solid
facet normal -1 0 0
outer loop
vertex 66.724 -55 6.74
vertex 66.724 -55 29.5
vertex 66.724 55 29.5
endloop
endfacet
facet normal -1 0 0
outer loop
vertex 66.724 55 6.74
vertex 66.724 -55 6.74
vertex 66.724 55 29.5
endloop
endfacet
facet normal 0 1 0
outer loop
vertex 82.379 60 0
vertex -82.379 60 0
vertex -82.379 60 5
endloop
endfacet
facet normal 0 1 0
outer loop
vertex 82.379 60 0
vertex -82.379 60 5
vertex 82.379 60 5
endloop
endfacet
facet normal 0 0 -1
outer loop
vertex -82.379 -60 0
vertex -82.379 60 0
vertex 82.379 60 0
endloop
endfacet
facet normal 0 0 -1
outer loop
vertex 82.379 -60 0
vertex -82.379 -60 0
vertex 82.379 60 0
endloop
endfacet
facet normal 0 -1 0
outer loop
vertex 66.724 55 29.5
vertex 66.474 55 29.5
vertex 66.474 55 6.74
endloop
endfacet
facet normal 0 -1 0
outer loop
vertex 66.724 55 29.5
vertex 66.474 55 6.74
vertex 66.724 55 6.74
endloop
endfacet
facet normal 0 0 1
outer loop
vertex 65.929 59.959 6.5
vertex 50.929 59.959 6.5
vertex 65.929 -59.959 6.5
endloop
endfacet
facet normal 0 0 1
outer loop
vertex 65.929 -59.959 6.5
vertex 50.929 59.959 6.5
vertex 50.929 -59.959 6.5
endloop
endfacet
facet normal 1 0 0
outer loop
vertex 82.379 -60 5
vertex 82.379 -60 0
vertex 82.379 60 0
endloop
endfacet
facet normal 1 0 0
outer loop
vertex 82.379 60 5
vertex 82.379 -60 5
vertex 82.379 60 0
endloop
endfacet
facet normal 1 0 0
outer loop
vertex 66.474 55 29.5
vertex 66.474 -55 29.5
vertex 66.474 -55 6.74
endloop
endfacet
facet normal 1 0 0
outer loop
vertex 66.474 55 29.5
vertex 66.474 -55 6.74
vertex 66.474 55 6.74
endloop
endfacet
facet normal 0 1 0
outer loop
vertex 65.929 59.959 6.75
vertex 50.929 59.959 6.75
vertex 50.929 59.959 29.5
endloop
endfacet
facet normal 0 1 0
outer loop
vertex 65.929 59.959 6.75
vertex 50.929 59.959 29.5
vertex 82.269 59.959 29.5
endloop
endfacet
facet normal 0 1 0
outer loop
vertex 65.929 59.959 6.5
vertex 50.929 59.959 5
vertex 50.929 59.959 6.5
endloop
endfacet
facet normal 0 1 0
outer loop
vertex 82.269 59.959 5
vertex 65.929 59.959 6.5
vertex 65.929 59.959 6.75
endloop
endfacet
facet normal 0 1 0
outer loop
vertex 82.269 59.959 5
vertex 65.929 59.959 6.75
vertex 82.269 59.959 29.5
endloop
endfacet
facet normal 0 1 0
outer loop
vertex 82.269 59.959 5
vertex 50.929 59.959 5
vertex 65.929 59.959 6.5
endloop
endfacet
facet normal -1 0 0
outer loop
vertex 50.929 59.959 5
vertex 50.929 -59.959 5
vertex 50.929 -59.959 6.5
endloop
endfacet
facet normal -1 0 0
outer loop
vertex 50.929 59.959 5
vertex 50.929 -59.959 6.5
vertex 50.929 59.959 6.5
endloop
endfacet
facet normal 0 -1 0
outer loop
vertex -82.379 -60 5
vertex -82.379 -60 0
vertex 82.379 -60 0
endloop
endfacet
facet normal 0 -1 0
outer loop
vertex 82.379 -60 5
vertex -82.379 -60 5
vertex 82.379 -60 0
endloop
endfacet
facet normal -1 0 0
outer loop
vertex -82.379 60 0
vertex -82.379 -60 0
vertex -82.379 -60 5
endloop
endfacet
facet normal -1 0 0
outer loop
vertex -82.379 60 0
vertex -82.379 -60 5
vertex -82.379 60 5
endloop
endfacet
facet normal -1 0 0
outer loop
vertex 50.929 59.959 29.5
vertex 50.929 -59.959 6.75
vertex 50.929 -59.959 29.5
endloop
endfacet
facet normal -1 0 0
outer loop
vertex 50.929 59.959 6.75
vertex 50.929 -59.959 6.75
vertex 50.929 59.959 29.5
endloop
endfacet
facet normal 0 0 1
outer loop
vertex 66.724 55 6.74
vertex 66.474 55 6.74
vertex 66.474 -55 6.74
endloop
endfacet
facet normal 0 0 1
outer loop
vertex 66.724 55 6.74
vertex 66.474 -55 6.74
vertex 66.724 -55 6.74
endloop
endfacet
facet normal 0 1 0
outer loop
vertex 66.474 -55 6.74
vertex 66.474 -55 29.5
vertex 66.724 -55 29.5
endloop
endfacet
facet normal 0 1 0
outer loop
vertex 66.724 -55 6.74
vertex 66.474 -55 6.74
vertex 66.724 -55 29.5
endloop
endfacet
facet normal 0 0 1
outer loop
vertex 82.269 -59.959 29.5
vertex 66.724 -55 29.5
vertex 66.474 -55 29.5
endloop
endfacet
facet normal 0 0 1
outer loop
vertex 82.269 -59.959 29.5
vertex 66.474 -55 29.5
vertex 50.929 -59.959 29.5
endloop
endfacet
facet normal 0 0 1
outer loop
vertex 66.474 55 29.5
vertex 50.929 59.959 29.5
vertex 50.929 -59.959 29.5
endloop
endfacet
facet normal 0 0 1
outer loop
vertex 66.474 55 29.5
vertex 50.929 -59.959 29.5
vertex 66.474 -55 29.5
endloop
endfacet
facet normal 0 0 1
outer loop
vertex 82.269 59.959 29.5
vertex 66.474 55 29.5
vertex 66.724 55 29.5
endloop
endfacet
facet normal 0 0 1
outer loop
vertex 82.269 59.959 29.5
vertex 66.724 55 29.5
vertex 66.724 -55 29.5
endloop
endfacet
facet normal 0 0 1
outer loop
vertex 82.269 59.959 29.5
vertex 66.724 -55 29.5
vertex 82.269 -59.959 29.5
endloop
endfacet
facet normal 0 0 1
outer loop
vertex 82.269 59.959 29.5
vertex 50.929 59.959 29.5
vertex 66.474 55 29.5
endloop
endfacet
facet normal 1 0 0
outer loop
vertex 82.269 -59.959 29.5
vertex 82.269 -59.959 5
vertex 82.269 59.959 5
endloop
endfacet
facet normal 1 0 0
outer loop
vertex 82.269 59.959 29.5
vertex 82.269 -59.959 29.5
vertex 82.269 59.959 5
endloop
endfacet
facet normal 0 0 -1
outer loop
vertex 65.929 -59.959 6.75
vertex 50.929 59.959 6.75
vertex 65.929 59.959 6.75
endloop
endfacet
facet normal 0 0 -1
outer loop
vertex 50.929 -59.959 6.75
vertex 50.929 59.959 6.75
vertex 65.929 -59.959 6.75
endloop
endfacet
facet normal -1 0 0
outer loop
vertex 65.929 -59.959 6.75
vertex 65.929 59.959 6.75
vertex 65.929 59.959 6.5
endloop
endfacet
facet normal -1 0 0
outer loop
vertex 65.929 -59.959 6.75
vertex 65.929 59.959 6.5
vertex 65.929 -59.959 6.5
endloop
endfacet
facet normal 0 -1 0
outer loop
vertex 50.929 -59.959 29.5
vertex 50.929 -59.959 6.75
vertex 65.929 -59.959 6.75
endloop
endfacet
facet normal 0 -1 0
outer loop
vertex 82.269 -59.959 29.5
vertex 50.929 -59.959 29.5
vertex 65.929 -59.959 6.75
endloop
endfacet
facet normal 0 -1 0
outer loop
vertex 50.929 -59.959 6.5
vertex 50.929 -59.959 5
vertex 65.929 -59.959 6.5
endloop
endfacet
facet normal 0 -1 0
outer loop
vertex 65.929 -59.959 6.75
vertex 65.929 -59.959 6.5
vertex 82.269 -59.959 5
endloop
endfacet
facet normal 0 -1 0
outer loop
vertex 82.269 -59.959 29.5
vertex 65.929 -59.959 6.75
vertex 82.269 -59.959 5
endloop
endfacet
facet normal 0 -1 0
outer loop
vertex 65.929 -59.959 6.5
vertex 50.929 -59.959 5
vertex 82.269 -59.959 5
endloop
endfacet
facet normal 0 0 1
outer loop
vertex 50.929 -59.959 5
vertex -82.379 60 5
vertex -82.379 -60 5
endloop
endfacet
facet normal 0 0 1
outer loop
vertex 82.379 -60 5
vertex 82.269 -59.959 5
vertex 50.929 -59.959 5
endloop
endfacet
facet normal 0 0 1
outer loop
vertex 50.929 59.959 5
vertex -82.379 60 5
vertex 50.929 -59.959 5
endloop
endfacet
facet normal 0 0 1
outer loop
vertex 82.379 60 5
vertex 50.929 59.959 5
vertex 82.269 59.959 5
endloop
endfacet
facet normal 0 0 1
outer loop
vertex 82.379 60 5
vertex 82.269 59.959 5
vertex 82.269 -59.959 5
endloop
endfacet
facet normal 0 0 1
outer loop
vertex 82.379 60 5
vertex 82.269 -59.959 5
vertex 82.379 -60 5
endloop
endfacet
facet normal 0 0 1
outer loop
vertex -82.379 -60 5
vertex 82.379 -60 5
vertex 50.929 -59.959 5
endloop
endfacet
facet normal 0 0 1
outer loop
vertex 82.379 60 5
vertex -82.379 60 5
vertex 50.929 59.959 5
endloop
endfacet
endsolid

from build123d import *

# Parameters (mm, degrees)
F0_W     = 164.7579842525
F0_H     = 120
F1_DEPTH = 5
F2_W     = 31.3406437635
F2_H     = 119.9177950621
F3_DEPTH = 29.5
F4_W     = 119.9177950621
F4_H     = 0.25
F5_DEPTH = 15
F6_W     = 0.25
F6_H     = 110
F7_DEPTH = 22.76


with BuildPart() as f1:
    # F0 (on Top) → F1 (new body)
    with BuildSketch(Plane.XY):
        Rectangle(F0_W, F0_H)
    extrude(amount=F1_DEPTH)

    # F2 (on Top) → F3 (join)
    with BuildSketch(Plane.XY):
        with Locations((66.5988624096, 0)):
            Rectangle(F2_W, F2_H)
    extrude(amount=F3_DEPTH)

    # F4 (on face) → F5 (cut)
    with BuildSketch(Plane(origin=(50.9285405278, 0, 0), x_dir=(0, -1, 0), z_dir=(-1, 0, 0))):
        with Locations((0, 6.625)):
            Rectangle(F4_W, F4_H)
    extrude(amount=-F5_DEPTH, mode=Mode.SUBTRACT)

    # F6 (on face) → F7 (cut)
    with BuildSketch(Plane.XY.offset(29.5)):
        with Locations((66.5988624096, 0)):
            Rectangle(F6_W, F6_H)
    extrude(amount=-F7_DEPTH, mode=Mode.SUBTRACT)


solid = f1.part
